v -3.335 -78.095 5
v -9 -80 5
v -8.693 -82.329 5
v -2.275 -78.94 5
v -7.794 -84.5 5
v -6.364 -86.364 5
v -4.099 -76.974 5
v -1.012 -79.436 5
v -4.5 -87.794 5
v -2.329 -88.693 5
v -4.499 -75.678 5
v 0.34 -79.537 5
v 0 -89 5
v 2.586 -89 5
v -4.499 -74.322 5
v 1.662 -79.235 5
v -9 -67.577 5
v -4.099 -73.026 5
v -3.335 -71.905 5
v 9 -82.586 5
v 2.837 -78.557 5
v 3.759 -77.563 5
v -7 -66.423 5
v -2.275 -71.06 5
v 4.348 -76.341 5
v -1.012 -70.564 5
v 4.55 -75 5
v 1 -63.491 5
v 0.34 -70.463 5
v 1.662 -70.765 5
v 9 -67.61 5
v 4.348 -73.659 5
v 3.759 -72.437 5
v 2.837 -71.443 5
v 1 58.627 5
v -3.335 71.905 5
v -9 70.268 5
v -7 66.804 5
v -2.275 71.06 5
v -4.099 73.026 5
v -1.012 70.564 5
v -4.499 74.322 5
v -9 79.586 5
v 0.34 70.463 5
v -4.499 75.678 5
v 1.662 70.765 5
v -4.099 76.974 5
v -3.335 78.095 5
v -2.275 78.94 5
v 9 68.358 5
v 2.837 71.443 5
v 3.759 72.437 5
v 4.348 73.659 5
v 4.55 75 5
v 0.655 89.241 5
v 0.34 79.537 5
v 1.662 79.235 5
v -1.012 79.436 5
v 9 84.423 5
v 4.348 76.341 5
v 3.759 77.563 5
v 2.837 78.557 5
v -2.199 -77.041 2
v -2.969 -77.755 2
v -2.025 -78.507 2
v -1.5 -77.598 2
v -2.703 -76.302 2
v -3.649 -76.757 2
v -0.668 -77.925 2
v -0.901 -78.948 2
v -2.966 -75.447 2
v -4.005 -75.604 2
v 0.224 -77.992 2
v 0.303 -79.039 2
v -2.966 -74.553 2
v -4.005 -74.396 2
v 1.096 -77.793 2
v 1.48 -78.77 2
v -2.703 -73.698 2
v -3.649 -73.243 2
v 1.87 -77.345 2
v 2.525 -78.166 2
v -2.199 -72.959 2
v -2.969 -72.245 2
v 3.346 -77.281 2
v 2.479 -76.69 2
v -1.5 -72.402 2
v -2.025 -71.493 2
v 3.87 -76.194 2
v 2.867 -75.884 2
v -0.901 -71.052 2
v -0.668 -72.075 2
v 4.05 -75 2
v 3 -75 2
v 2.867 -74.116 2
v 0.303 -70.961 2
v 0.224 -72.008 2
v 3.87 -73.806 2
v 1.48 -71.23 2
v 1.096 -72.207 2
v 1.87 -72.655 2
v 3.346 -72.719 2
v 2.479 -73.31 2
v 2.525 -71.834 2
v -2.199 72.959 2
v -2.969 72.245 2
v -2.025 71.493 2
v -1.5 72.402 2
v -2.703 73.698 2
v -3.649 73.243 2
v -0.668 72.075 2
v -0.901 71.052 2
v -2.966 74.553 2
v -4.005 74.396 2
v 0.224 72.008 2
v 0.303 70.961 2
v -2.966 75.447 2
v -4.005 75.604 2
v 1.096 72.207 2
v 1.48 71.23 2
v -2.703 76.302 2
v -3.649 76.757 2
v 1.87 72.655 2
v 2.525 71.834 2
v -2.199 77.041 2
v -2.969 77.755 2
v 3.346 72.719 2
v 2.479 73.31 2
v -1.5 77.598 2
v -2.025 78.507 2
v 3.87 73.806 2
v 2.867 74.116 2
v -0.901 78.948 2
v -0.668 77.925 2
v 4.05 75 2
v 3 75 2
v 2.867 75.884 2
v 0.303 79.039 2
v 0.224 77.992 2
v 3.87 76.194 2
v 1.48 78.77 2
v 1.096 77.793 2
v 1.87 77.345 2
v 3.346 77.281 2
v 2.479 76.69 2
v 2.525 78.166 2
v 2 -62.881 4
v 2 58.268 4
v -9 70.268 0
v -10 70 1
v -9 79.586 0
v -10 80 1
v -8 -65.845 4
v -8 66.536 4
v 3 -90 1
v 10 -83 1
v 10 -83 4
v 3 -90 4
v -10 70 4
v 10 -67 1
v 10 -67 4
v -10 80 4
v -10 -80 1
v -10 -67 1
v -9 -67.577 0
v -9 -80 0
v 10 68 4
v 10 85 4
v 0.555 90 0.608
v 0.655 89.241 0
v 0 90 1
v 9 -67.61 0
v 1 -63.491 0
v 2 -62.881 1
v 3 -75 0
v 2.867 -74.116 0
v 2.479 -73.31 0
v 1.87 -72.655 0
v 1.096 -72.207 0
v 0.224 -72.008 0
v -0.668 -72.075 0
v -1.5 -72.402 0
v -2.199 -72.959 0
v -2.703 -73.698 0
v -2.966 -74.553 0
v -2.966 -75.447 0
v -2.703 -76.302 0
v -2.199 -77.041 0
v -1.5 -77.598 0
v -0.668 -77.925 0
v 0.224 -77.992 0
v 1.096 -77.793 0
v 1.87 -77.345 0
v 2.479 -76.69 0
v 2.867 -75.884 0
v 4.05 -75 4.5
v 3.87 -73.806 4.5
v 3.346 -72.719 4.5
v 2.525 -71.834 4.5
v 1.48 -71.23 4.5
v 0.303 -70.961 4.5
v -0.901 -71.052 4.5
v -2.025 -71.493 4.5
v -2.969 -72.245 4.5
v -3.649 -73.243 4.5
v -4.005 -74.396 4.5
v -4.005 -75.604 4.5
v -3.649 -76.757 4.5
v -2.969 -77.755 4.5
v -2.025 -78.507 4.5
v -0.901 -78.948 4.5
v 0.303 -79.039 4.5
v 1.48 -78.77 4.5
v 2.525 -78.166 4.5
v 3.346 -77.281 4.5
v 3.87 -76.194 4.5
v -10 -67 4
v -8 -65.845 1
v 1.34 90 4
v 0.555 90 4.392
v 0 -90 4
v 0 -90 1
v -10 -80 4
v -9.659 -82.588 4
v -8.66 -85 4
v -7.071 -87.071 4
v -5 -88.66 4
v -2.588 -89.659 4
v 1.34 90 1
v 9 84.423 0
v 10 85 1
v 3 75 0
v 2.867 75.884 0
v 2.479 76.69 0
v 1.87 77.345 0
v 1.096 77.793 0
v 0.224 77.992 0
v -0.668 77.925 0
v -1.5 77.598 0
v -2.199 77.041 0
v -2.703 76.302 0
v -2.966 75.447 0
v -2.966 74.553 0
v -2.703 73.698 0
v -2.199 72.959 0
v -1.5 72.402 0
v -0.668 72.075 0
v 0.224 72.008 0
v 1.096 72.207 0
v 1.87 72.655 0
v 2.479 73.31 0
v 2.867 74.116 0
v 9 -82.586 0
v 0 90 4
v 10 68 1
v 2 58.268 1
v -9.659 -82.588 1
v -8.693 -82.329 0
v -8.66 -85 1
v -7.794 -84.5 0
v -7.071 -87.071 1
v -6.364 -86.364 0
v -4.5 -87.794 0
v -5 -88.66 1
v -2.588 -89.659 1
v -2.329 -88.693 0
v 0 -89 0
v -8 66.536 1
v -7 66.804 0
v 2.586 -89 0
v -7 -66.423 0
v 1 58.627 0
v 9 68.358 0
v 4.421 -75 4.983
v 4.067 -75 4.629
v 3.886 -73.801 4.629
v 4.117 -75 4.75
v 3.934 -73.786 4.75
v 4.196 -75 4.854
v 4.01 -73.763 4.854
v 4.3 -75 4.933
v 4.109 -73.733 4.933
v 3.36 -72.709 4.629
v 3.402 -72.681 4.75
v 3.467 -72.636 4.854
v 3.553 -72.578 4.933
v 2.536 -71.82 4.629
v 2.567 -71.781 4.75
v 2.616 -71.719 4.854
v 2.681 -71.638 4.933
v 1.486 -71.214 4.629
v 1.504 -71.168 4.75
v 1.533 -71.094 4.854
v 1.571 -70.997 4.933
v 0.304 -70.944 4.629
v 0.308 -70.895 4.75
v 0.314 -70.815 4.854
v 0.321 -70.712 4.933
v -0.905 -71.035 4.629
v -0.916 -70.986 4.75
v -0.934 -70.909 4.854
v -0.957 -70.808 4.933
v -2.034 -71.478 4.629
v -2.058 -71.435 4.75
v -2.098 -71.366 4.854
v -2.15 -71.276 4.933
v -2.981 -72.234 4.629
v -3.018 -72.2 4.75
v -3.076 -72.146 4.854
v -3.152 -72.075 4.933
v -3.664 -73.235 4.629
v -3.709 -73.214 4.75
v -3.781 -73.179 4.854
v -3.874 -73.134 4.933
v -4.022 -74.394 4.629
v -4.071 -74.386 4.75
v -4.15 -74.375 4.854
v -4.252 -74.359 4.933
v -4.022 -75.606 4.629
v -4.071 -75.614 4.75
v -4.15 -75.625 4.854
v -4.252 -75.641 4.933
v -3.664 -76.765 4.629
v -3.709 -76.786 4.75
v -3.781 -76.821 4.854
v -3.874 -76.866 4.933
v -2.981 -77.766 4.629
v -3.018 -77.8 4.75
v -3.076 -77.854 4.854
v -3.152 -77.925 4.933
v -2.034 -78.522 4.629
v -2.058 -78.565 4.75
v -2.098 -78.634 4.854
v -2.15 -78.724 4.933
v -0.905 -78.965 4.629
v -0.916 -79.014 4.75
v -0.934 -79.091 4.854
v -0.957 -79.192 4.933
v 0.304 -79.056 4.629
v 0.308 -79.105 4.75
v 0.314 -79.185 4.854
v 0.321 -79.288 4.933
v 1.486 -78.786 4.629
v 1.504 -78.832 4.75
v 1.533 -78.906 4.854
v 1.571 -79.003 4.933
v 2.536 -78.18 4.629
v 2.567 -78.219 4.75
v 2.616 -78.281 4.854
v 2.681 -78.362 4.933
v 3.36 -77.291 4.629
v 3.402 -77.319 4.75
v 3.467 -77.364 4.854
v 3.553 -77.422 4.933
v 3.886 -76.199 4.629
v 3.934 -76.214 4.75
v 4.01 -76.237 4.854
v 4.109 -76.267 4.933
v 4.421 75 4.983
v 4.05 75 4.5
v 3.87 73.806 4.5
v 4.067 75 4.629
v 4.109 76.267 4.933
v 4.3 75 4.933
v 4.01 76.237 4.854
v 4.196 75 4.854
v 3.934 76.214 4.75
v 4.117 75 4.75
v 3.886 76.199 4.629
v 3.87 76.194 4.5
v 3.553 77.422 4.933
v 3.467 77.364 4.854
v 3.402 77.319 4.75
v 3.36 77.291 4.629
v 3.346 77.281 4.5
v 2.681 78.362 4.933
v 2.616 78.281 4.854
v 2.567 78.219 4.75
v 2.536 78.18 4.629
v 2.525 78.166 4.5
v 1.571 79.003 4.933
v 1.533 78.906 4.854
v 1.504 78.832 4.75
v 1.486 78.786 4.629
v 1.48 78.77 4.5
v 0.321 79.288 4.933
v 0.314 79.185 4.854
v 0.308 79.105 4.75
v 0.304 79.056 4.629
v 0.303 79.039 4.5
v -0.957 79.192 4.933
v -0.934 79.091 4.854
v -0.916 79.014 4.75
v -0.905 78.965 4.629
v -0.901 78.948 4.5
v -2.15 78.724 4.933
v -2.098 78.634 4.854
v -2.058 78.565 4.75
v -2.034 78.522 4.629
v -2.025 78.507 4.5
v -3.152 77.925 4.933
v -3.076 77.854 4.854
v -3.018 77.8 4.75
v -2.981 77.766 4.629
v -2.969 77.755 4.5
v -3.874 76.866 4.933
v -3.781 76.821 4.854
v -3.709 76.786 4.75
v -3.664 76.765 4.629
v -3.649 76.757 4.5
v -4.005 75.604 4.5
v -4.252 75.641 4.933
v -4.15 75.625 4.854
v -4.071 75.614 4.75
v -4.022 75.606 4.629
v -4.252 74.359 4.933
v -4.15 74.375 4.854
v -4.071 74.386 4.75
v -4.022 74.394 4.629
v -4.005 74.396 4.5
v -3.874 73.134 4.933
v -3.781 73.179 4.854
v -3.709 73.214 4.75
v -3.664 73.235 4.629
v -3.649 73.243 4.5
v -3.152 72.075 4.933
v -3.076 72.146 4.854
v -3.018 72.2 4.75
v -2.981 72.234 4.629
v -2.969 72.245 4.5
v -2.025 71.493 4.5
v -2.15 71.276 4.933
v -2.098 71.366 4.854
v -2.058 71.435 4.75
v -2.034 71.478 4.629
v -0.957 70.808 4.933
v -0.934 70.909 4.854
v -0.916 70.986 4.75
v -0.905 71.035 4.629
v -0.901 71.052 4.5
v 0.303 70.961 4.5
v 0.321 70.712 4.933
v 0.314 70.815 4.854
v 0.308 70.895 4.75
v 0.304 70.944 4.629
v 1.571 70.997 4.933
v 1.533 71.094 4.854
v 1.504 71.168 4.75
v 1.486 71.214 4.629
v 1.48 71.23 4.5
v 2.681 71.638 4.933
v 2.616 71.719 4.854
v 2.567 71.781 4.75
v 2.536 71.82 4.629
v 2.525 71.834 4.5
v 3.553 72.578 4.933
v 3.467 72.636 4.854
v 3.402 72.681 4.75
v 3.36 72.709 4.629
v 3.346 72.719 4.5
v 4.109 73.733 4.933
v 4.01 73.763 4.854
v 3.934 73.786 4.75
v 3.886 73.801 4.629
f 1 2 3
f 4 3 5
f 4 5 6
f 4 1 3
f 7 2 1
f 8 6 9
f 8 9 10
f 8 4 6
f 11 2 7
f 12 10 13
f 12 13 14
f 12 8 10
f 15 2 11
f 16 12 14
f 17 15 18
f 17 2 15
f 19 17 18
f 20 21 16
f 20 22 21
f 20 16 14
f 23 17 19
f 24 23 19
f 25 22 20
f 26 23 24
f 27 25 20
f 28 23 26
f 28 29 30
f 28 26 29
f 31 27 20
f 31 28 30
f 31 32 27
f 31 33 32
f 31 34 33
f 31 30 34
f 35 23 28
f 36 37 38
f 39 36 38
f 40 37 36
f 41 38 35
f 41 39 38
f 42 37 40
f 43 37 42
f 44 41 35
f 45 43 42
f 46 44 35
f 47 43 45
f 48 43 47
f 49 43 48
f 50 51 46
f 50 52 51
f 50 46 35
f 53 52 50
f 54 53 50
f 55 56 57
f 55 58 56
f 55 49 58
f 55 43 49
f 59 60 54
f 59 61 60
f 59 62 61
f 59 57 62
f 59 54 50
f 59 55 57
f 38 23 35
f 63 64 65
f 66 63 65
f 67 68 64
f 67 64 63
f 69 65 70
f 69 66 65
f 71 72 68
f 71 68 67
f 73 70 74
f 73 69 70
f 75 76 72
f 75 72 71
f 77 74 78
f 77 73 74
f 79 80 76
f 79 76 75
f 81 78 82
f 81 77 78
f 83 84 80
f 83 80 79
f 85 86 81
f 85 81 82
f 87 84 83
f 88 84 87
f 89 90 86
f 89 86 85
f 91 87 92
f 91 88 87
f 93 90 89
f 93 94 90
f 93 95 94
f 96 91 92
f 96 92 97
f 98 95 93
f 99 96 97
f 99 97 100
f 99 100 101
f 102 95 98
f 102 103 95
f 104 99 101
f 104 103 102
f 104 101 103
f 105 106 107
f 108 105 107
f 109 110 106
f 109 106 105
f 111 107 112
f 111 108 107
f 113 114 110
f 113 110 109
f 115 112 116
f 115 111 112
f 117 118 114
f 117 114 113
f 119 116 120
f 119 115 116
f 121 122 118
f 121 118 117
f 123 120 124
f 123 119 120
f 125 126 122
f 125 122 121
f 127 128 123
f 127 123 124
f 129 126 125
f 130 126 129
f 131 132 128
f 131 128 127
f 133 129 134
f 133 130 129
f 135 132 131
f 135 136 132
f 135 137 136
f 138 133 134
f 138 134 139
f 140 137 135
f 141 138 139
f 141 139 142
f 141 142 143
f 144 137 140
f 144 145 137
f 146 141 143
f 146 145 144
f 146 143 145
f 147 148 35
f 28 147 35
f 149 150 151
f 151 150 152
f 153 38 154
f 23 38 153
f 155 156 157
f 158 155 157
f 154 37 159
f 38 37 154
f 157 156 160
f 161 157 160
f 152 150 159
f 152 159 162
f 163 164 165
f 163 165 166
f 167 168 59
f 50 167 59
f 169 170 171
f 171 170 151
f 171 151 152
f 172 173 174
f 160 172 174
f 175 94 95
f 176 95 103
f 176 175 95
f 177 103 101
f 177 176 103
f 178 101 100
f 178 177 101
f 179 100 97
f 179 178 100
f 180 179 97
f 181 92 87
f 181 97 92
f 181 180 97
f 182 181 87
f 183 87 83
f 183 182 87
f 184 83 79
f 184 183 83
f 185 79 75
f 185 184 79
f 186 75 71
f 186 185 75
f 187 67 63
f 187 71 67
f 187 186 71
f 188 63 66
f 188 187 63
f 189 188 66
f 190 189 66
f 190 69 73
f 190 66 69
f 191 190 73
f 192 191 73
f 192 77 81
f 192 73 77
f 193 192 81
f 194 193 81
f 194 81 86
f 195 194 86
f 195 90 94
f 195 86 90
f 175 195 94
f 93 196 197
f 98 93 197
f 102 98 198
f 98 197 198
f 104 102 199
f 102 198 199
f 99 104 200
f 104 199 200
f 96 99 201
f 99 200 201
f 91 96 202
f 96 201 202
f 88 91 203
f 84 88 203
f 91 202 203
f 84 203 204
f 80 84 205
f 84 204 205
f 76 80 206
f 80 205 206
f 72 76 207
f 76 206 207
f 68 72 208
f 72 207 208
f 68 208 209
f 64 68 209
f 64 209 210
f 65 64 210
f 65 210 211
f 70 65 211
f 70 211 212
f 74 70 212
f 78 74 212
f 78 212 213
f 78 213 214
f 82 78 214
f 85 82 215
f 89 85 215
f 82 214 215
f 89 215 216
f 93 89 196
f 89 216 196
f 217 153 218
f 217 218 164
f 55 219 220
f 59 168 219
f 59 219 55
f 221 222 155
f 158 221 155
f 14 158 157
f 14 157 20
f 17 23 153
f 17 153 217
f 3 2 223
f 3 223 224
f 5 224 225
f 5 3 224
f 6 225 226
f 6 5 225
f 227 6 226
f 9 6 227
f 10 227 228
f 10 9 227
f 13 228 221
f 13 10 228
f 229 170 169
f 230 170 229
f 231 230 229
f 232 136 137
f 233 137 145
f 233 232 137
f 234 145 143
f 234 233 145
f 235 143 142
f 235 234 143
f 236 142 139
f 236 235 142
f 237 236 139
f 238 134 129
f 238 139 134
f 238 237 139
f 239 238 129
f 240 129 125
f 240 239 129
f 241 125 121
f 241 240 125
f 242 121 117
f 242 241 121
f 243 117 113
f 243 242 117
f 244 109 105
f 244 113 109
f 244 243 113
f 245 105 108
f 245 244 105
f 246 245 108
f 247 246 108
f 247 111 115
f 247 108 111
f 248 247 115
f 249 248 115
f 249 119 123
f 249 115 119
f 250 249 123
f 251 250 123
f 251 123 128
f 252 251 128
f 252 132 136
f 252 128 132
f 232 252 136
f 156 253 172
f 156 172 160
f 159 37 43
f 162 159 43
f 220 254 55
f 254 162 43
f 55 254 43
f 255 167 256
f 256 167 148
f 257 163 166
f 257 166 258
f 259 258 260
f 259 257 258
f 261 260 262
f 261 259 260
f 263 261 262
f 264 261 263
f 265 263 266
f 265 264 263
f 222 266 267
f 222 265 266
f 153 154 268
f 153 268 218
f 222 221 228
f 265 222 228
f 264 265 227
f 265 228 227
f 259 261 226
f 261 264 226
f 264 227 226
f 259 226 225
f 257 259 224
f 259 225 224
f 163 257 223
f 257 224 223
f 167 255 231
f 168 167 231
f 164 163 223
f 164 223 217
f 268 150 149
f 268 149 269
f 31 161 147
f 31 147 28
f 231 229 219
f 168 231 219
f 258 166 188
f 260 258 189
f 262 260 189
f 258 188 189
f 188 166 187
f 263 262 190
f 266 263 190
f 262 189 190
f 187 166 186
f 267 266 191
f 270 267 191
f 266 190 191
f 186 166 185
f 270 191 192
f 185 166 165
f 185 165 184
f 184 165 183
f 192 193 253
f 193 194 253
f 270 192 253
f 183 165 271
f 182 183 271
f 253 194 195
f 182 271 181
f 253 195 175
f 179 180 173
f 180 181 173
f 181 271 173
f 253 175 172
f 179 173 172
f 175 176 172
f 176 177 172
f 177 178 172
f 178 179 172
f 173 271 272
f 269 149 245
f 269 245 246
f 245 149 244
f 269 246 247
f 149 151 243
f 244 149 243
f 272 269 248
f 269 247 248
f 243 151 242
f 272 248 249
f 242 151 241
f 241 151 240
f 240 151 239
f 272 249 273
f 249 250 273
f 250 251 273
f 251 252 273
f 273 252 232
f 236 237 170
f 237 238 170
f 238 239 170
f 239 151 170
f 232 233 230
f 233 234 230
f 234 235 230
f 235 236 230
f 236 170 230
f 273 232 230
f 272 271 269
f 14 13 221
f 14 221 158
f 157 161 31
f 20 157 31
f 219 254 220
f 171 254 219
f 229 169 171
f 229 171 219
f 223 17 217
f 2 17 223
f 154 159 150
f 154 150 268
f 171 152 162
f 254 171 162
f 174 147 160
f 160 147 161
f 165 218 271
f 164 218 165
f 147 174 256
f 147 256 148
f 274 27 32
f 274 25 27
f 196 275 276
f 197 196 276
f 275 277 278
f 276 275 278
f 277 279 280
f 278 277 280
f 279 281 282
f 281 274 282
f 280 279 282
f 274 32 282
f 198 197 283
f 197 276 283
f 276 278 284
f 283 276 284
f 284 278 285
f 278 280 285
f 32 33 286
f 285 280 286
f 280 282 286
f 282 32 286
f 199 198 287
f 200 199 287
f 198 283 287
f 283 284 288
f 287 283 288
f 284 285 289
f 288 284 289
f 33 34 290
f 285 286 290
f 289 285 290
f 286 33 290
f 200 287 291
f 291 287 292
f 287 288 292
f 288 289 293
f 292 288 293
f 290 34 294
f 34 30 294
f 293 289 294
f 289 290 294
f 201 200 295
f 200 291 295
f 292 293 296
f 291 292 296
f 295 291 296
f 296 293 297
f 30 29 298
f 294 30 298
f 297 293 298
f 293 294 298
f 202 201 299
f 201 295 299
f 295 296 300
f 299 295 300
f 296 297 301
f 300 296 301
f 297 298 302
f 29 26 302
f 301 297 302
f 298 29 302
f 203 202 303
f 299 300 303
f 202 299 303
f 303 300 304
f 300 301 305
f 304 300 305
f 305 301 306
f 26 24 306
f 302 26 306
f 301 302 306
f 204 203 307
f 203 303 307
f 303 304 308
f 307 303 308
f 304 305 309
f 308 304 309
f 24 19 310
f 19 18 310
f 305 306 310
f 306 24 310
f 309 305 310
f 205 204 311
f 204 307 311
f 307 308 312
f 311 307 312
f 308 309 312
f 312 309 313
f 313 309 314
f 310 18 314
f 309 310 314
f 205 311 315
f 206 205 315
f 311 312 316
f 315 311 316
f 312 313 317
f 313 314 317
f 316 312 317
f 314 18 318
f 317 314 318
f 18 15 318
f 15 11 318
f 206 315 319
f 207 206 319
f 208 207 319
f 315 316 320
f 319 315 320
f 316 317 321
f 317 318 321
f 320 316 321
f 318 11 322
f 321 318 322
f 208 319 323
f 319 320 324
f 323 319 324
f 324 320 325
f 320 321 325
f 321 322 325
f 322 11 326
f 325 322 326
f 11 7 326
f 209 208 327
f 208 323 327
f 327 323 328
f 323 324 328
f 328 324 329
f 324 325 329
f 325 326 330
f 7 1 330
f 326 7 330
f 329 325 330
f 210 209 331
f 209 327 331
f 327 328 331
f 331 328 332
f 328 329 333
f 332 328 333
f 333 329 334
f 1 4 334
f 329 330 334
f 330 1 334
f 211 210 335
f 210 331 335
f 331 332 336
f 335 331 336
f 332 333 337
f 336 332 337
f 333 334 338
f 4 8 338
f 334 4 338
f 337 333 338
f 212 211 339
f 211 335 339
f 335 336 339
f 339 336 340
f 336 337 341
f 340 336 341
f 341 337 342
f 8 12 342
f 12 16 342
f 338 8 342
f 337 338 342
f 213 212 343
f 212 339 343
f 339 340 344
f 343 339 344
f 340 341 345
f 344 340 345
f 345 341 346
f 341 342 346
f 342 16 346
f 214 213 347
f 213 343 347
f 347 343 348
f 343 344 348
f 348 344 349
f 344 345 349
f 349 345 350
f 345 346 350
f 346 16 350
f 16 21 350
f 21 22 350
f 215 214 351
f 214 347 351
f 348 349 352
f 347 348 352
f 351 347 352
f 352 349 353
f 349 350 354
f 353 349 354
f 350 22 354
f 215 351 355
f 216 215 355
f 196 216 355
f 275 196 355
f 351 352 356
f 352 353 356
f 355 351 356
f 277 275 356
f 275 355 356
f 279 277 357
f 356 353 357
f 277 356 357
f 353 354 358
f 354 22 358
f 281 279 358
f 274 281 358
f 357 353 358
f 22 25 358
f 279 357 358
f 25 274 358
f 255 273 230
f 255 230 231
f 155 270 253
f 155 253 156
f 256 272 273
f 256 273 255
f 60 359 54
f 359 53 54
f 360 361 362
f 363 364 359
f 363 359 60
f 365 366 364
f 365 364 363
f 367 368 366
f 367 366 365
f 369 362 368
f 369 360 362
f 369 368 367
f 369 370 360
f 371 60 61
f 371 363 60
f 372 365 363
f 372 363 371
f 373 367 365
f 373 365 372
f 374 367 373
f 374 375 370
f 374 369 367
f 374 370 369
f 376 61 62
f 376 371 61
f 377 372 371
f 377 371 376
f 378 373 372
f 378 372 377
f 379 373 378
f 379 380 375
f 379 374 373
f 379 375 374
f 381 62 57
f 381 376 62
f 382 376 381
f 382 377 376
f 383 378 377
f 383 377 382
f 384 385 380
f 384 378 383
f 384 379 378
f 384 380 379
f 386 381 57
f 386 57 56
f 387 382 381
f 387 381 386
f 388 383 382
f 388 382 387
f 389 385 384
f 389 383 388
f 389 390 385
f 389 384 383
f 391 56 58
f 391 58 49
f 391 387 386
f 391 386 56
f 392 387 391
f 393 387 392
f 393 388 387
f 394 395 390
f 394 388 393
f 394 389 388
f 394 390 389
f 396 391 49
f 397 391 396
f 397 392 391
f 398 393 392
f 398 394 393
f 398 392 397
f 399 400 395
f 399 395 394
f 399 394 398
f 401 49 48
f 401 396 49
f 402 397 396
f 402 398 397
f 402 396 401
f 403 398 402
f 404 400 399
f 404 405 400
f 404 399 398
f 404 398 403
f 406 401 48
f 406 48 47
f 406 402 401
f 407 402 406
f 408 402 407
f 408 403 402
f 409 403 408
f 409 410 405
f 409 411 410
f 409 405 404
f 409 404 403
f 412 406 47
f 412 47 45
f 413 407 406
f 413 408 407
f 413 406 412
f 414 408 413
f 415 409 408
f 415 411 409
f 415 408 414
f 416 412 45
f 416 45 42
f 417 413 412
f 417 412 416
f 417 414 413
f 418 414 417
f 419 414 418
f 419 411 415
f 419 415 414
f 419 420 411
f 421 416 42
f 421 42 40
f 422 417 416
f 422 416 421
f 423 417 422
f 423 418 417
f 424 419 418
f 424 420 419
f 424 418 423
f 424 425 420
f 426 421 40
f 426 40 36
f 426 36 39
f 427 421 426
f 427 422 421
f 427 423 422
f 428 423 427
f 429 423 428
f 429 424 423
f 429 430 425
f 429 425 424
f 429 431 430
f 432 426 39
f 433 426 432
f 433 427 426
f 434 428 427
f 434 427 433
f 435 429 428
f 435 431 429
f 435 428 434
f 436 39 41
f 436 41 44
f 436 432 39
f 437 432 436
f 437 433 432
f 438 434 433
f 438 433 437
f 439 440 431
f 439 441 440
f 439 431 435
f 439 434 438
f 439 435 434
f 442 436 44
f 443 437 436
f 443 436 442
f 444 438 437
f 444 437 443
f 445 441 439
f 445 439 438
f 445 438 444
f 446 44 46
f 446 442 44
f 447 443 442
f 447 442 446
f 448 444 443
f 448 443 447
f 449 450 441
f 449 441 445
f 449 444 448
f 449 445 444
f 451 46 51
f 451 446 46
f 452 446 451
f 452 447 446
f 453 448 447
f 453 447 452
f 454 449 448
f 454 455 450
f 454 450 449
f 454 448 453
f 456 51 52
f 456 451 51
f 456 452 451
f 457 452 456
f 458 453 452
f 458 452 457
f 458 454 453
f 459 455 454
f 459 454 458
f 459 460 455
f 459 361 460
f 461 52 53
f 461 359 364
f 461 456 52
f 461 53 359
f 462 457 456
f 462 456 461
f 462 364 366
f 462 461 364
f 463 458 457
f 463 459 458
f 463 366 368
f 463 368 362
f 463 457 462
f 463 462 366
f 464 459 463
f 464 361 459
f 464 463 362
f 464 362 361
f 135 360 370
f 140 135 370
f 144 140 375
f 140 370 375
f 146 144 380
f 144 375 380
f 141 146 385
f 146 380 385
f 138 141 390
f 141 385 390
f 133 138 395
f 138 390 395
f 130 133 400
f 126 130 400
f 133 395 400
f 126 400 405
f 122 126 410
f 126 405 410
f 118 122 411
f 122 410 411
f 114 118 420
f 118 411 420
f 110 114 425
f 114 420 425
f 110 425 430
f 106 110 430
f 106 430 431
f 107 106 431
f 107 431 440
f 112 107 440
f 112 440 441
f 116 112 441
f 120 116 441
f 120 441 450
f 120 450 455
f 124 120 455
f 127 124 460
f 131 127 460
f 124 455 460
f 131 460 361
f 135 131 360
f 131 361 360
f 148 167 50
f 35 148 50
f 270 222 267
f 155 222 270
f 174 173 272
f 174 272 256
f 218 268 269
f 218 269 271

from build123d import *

# Parameters (mm, degrees)
SKETCH_1_W          = 20
SKETCH_1_H          = 180
SKETCH_1_R          = 3
EXTRUDE_1_DEPTH     = 5
SKETCH_2_R          = 4.05
CUT_EXTRUDE_1_DEPTH = 3
CHAMFER_1_SIZE      = 10
CHAMFER_2_SIZE      = 5
CHAMFER_2_SIZE2     = 8.660254038
CUT_EXTRUDE_2_DEPTH = 10
FILLET_1_R          = 10
CHAMFER_3_SIZE      = 7
CHAMFER_5_SIZE      = 1
CUT_EXTRUDE_3_DEPTH = 10
CHAMFER_6_SIZE      = 1
FILLET_2_R          = 0.5
FILLET_3_R          = 0.5


with BuildPart() as part:
    # 草图1 → 凸台-拉伸1 (new body)
    with BuildSketch(Plane.XY):
        Rectangle(SKETCH_1_W, SKETCH_1_H)
        with Locations((0, -75)):
            Circle(SKETCH_1_R, mode=Mode.SUBTRACT)
        with Locations((0, 75)):
            Circle(SKETCH_1_R, mode=Mode.SUBTRACT)
    extrude(amount=EXTRUDE_1_DEPTH)

    # 草图2 → 切除-拉伸1 (cut)
    with BuildSketch(Plane.XY.offset(5)):
        with Locations((0, 75)):
            Circle(SKETCH_2_R)
        with Locations((0, -75)):
            Circle(SKETCH_2_R)
    extrude(amount=-CUT_EXTRUDE_1_DEPTH, mode=Mode.SUBTRACT)

    # 倒角1
    chamfer_1_edges = [part.edges().sort_by_distance(p)[0] for p in [
        (-10, 90, 2.5),
    ]]
    chamfer(chamfer_1_edges, length=CHAMFER_1_SIZE)

    # 倒角2
    chamfer_2_edges = [part.edges().sort_by_distance(p)[0] for p in [
        (10, 90, 2.5),
    ]]
    chamfer_2_side = [part.faces().sort_by_distance(p)[0] for p in [
        (10, 0, 2.5),
    ]]
    chamfer(chamfer_2_edges, length=CHAMFER_2_SIZE, length2=CHAMFER_2_SIZE2, reference=chamfer_2_side[0])

    # 草图3 → 切除-拉伸2 (cut)
    with BuildSketch(Plane.XY.offset(5)):
        Polygon((10, 68), (2, 58.268253796), (2, -62.880981993), (10, -67), align=None)
    extrude(amount=-CUT_EXTRUDE_2_DEPTH, mode=Mode.SUBTRACT)

    # 圆角1
    fillet_1_edges = [part.edges().sort_by_distance(p)[0] for p in [
        (-10, -90, 2.5),
    ]]
    fillet(fillet_1_edges, radius=FILLET_1_R)

    # 倒角3
    chamfer_3_edges = [part.edges().sort_by_distance(p)[0] for p in [
        (10, -90, 2.5),
    ]]
    chamfer(chamfer_3_edges, length=CHAMFER_3_SIZE)

    # 倒角5
    # the kernel refuses this chamfer: 1 mm, written as the material it takes off along each edge
    with BuildSketch(Plane(origin=(-11.81845448, 78.18154552, 0), x_dir=(0.7068394360706736, -0.7068394360706736, -0.02749587661058609), z_dir=(0.7071067811865476, 0.7071067811865476, 0)), Plane(origin=(-11.81845448, 78.18154552, 5), x_dir=(-0.019442520806012064, 0.019442520806012064, -0.9996219169112968), z_dir=(0.7071067811865476, 0.7071067811865476, 0))) as chamfer_5_piece_1:
        Polygon((CHAMFER_5_SIZE * 0.999621916911, -CHAMFER_5_SIZE * 0.0274958766106), (-CHAMFER_5_SIZE * 0.0274958766106, -CHAMFER_5_SIZE * 0.999621916911), (0, 0), align=None)
    extrude(amount=19.2855016, mode=Mode.SUBTRACT)
    with BuildSketch(Plane(origin=(12.227142798, 83.714158506, 0), x_dir=(-0.49981095845564655, -0.8656979742248815, -0.02749587661058648), z_dir=(-0.8660254037844397, 0.49999999999999817, 0)), Plane(origin=(12.227142798, 83.714158506, 5), x_dir=(0.013747938305290464, 0.02381212764408557, -0.999621916911297), z_dir=(-0.8660254037844397, 0.49999999999999817, 0))) as chamfer_5_piece_2:
        Polygon((CHAMFER_5_SIZE * 0.999621916911, CHAMFER_5_SIZE * 0.0274958766106), (-CHAMFER_5_SIZE * 0.0274958766106, CHAMFER_5_SIZE * 0.999621916911), (0, 0), align=None)
    extrude(amount=15.143365976, mode=Mode.SUBTRACT)
    with BuildSketch(Plane(origin=(1.18154552, -91.81845448, 0), x_dir=(-0.7068394360706736, 0.7068394360706735, -0.027495876610586254), z_dir=(0.7071067811865476, 0.7071067811865476, 0)), Plane(origin=(1.18154552, -91.81845448, 5), x_dir=(0.01944252080601271, -0.01944252080601271, -0.9996219169112968), z_dir=(0.7071067811865476, 0.7071067811865476, 0))) as chamfer_5_piece_3:
        Polygon((CHAMFER_5_SIZE * 0.999621916911, CHAMFER_5_SIZE * 0.0274958766106), (-CHAMFER_5_SIZE * 0.0274958766106, CHAMFER_5_SIZE * 0.999621916911), (0, 0), align=None)
    extrude(amount=15.042860913, mode=Mode.SUBTRACT)
    with BuildSketch(Plane(origin=(10, -85.571682988, 0), x_dir=(-0.9996219169112968, 0, -0.02749587661058639), z_dir=(0, 1, 0)), Plane(origin=(10, -85.571682988, 5), x_dir=(0.027495876610585623, 0, -0.9996219169112968), z_dir=(0, 1, 0))) as chamfer_5_piece_4:
        Polygon((CHAMFER_5_SIZE * 0.999621916911, CHAMFER_5_SIZE * 0.0274958766106), (-CHAMFER_5_SIZE * 0.0274958766106, CHAMFER_5_SIZE * 0.999621916911), (0, 0), align=None)
    extrude(amount=21.143365976, mode=Mode.SUBTRACT)
    with BuildSketch(Plane(origin=(-0.286415982, -61.703758417, 0), x_dir=(-0.4575908043726023, -0.8887376623745898, -0.027495876610586185), z_dir=(0.8890738061453024, -0.4577638771531731, 0))) as chamfer_5_piece_5_section:
        Polygon((CHAMFER_5_SIZE * 0.999621916911, -CHAMFER_5_SIZE * 0.0274958766106), (-CHAMFER_5_SIZE * 0.0274958766106, -CHAMFER_5_SIZE * 0.999621916911), (0, 0), align=None)
    chamfer_5_piece_5 = extrude(amount=14.141494078, mode=Mode.PRIVATE)
    chamfer_5_piece_5 = split(chamfer_5_piece_5, bisect_by=Plane(origin=(2, -65.858290637, 0.331326909), z_dir=(1, 0, 0)), keep=Keep.TOP, mode=Mode.PRIVATE)
    add(chamfer_5_piece_5, mode=Mode.SUBTRACT)
    with BuildSketch(Plane(origin=(10, 65.428317012, 0), x_dir=(-0.9996219169112968, 0, -0.02749587661058639), z_dir=(0, 1, 0)), Plane(origin=(10, 65.428317012, 5), x_dir=(0.027495876610585623, 0, -0.9996219169112968), z_dir=(0, 1, 0))) as chamfer_5_piece_6:
        Polygon((CHAMFER_5_SIZE * 0.999621916911, CHAMFER_5_SIZE * 0.0274958766106), (-CHAMFER_5_SIZE * 0.0274958766106, CHAMFER_5_SIZE * 0.999621916911), (0, 0), align=None)
    extrude(amount=22.143365976, mode=Mode.SUBTRACT)
    with BuildSketch(Plane(origin=(11.633087807, 69.986599508, 0), x_dir=(-0.7721979799806099, 0.6347867803312237, -0.02749587661058653), z_dir=(-0.6350268732528727, -0.7724900454029683, 0))) as chamfer_5_piece_7_section:
        Polygon((CHAMFER_5_SIZE * 0.999621916911, -CHAMFER_5_SIZE * 0.0274958766106), (-CHAMFER_5_SIZE * 0.0274958766106, -CHAMFER_5_SIZE * 0.999621916911), (0, 0), align=None)
    chamfer_5_piece_7 = extrude(amount=17.741258029, mode=Mode.PRIVATE)
    chamfer_5_piece_7 = split(chamfer_5_piece_7, bisect_by=Plane(origin=(2, 64.486030302, 0.332589974), z_dir=(1, 0, 0)), keep=Keep.TOP, mode=Mode.PRIVATE)
    add(chamfer_5_piece_7, mode=Mode.SUBTRACT)
    with BuildSketch(Plane(origin=(2, 60.839936784, 0), x_dir=(-0.9996219169112968, 0, -0.027495876610586365), z_dir=(0, -1, 0))) as chamfer_5_piece_8_section:
        Polygon((CHAMFER_5_SIZE * 0.999621916911, -CHAMFER_5_SIZE * 0.0274958766106), (-CHAMFER_5_SIZE * 0.0274958766106, -CHAMFER_5_SIZE * 0.999621916911), (0, 0), align=None)
    chamfer_5_piece_8 = extrude(amount=126.292601765, mode=Mode.PRIVATE)
    chamfer_5_piece_8 = split(chamfer_5_piece_8, bisect_by=Plane(origin=(-22.866025016, -50.078031392, 0.330281086), z_dir=(0.4577638771531731, 0.8890738061453024, 0)), keep=Keep.TOP, mode=Mode.PRIVATE)
    chamfer_5_piece_8 = split(chamfer_5_piece_8, bisect_by=Plane(origin=(-27.904215912, 21.890723836, 0.330281086), z_dir=(0.7724900454029683, -0.6350268732528727, 0)), keep=Keep.TOP, mode=Mode.PRIVATE)
    add(chamfer_5_piece_8, mode=Mode.SUBTRACT)
    with BuildSketch(Plane(origin=(-0.286415982, -61.703758417, 5), x_dir=(0.012586619082987256, 0.024445863671475603, -0.9996219169112968), z_dir=(0.8890738061453024, -0.4577638771531731, 0))) as chamfer_5_piece_9_section:
        Polygon((CHAMFER_5_SIZE * 0.999621916911, -CHAMFER_5_SIZE * 0.0274958766106), (-CHAMFER_5_SIZE * 0.0274958766106, -CHAMFER_5_SIZE * 0.999621916911), (0, 0), align=None)
    chamfer_5_piece_9 = extrude(amount=14.141494078, mode=Mode.PRIVATE)
    chamfer_5_piece_9 = split(chamfer_5_piece_9, bisect_by=Plane(origin=(2, -65.858290637, 4.668673091), z_dir=(1, 0, 0)), keep=Keep.TOP, mode=Mode.PRIVATE)
    add(chamfer_5_piece_9, mode=Mode.SUBTRACT)
    with BuildSketch(Plane(origin=(11.633087807, 69.986599508, 5), x_dir=(0.02124029097130686, -0.017460620551367937, -0.9996219169112968), z_dir=(-0.6350268732528727, -0.7724900454029683, 0))) as chamfer_5_piece_10_section:
        Polygon((CHAMFER_5_SIZE * 0.999621916911, -CHAMFER_5_SIZE * 0.0274958766106), (-CHAMFER_5_SIZE * 0.0274958766106, -CHAMFER_5_SIZE * 0.999621916911), (0, 0), align=None)
    chamfer_5_piece_10 = extrude(amount=17.741258029, mode=Mode.PRIVATE)
    chamfer_5_piece_10 = split(chamfer_5_piece_10, bisect_by=Plane(origin=(2, 64.486030302, 4.667410026), z_dir=(1, 0, 0)), keep=Keep.TOP, mode=Mode.PRIVATE)
    add(chamfer_5_piece_10, mode=Mode.SUBTRACT)
    with BuildSketch(Plane(origin=(2, 60.839936784, 5), x_dir=(0.027495876610586487, 0, -0.9996219169112968), z_dir=(0, -1, 0))) as chamfer_5_piece_11_section:
        Polygon((CHAMFER_5_SIZE * 0.999621916911, -CHAMFER_5_SIZE * 0.0274958766106), (-CHAMFER_5_SIZE * 0.0274958766106, -CHAMFER_5_SIZE * 0.999621916911), (0, 0), align=None)
    chamfer_5_piece_11 = extrude(amount=126.292601765, mode=Mode.PRIVATE)
    chamfer_5_piece_11 = split(chamfer_5_piece_11, bisect_by=Plane(origin=(-22.866025016, -50.078031392, 4.669718914), z_dir=(0.4577638771531731, 0.8890738061453024, 0)), keep=Keep.TOP, mode=Mode.PRIVATE)
    chamfer_5_piece_11 = split(chamfer_5_piece_11, bisect_by=Plane(origin=(-27.904215912, 21.890723836, 4.669718914), z_dir=(0.7724900454029683, -0.6350268732528727, 0)), keep=Keep.TOP, mode=Mode.PRIVATE)
    add(chamfer_5_piece_11, mode=Mode.SUBTRACT)
    with BuildSketch(Plane(origin=(-0.286415982, -61.703758417, 0), x_dir=(-0.4575908043726023, -0.8887376623745898, -0.027495876610586185), z_dir=(0.8890738061453024, -0.4577638771531731, 0))) as chamfer_5_piece_12a_section:
        Polygon((CHAMFER_5_SIZE * 0.999621916911, -CHAMFER_5_SIZE * 0.0274958766106), (-CHAMFER_5_SIZE * 0.0274958766106, -CHAMFER_5_SIZE * 0.999621916911), (0, 0), align=None)
    chamfer_5_piece_12a = extrude(amount=14.141494078, mode=Mode.PRIVATE)
    chamfer_5_piece_12a = split(chamfer_5_piece_12a, bisect_by=Plane(origin=(2, -62.636454887, 0.323417731), z_dir=(-1, 0, 0)), keep=Keep.TOP, mode=Mode.PRIVATE)
    with BuildSketch(Plane(origin=(2, 60.839936784, 0), x_dir=(-0.9996219169112968, 0, -0.027495876610586365), z_dir=(0, -1, 0))) as chamfer_5_piece_12b_section:
        Polygon((CHAMFER_5_SIZE * 0.999621916911, -CHAMFER_5_SIZE * 0.0274958766106), (-CHAMFER_5_SIZE * 0.0274958766106, -CHAMFER_5_SIZE * 0.999621916911), (0, 0), align=None)
    chamfer_5_piece_12b = extrude(amount=126.292601765, mode=Mode.PRIVATE)
    chamfer_5_piece_12b = split(chamfer_5_piece_12b, bisect_by=Plane(origin=(2.217402645, -62.992917669, 0.323417731), z_dir=(-0.4577638771531731, -0.8890738061453024, 0)), keep=Keep.TOP, mode=Mode.PRIVATE)
    chamfer_5_piece_12 = chamfer_5_piece_12a & chamfer_5_piece_12b
    add(chamfer_5_piece_12, mode=Mode.SUBTRACT)
    with BuildSketch(Plane(origin=(2, 60.839936784, 0), x_dir=(-0.9996219169112968, 0, -0.027495876610586365), z_dir=(0, -1, 0))) as chamfer_5_piece_13a_section:
        Polygon((CHAMFER_5_SIZE * 0.999621916911, -CHAMFER_5_SIZE * 0.0274958766106), (-CHAMFER_5_SIZE * 0.0274958766106, -CHAMFER_5_SIZE * 0.999621916911), (0, 0), align=None)
    chamfer_5_piece_13a = extrude(amount=126.292601765, mode=Mode.PRIVATE)
    chamfer_5_piece_13a = split(chamfer_5_piece_13a, bisect_by=Plane(origin=(2.381147495, 58.731907632, 0.315902133), z_dir=(-0.7724900454029683, 0.6350268732528727, 0)), keep=Keep.TOP, mode=Mode.PRIVATE)
    with BuildSketch(Plane(origin=(11.633087807, 69.986599508, 0), x_dir=(-0.7721979799806099, 0.6347867803312237, -0.02749587661058653), z_dir=(-0.6350268732528727, -0.7724900454029683, 0))) as chamfer_5_piece_13b_section:
        Polygon((CHAMFER_5_SIZE * 0.999621916911, -CHAMFER_5_SIZE * 0.0274958766106), (-CHAMFER_5_SIZE * 0.0274958766106, -CHAMFER_5_SIZE * 0.999621916911), (0, 0), align=None)
    chamfer_5_piece_13b = extrude(amount=17.741258029, mode=Mode.PRIVATE)
    chamfer_5_piece_13b = split(chamfer_5_piece_13b, bisect_by=Plane(origin=(2, 57.668046921, 0.315902133), z_dir=(-1, 0, 0)), keep=Keep.TOP, mode=Mode.PRIVATE)
    chamfer_5_piece_13 = chamfer_5_piece_13a & chamfer_5_piece_13b
    add(chamfer_5_piece_13, mode=Mode.SUBTRACT)
    with BuildSketch(Plane(origin=(-0.286415982, -61.703758417, 5), x_dir=(0.012586619082987256, 0.024445863671475603, -0.9996219169112968), z_dir=(0.8890738061453024, -0.4577638771531731, 0))) as chamfer_5_piece_14a_section:
        Polygon((CHAMFER_5_SIZE * 0.999621916911, -CHAMFER_5_SIZE * 0.0274958766106), (-CHAMFER_5_SIZE * 0.0274958766106, -CHAMFER_5_SIZE * 0.999621916911), (0, 0), align=None)
    chamfer_5_piece_14a = extrude(amount=14.141494078, mode=Mode.PRIVATE)
    chamfer_5_piece_14a = split(chamfer_5_piece_14a, bisect_by=Plane(origin=(2, -62.636454887, 4.676582269), z_dir=(-1, 0, 0)), keep=Keep.TOP, mode=Mode.PRIVATE)
    with BuildSketch(Plane(origin=(2, 60.839936784, 5), x_dir=(0.027495876610586487, 0, -0.9996219169112968), z_dir=(0, -1, 0))) as chamfer_5_piece_14b_section:
        Polygon((CHAMFER_5_SIZE * 0.999621916911, -CHAMFER_5_SIZE * 0.0274958766106), (-CHAMFER_5_SIZE * 0.0274958766106, -CHAMFER_5_SIZE * 0.999621916911), (0, 0), align=None)
    chamfer_5_piece_14b = extrude(amount=126.292601765, mode=Mode.PRIVATE)
    chamfer_5_piece_14b = split(chamfer_5_piece_14b, bisect_by=Plane(origin=(2.217402645, -62.992917669, 4.676582269), z_dir=(-0.4577638771531731, -0.8890738061453024, 0)), keep=Keep.TOP, mode=Mode.PRIVATE)
    chamfer_5_piece_14 = chamfer_5_piece_14a & chamfer_5_piece_14b
    add(chamfer_5_piece_14, mode=Mode.SUBTRACT)
    with BuildSketch(Plane(origin=(2, 60.839936784, 5), x_dir=(0.027495876610586487, 0, -0.9996219169112968), z_dir=(0, -1, 0))) as chamfer_5_piece_15a_section:
        Polygon((CHAMFER_5_SIZE * 0.999621916911, -CHAMFER_5_SIZE * 0.0274958766106), (-CHAMFER_5_SIZE * 0.0274958766106, -CHAMFER_5_SIZE * 0.999621916911), (0, 0), align=None)
    chamfer_5_piece_15a = extrude(amount=126.292601765, mode=Mode.PRIVATE)
    chamfer_5_piece_15a = split(chamfer_5_piece_15a, bisect_by=Plane(origin=(2.381147495, 58.731907632, 4.684097867), z_dir=(-0.7724900454029683, 0.6350268732528727, 0)), keep=Keep.TOP, mode=Mode.PRIVATE)
    with BuildSketch(Plane(origin=(11.633087807, 69.986599508, 5), x_dir=(0.02124029097130686, -0.017460620551367937, -0.9996219169112968), z_dir=(-0.6350268732528727, -0.7724900454029683, 0))) as chamfer_5_piece_15b_section:
        Polygon((CHAMFER_5_SIZE * 0.999621916911, -CHAMFER_5_SIZE * 0.0274958766106), (-CHAMFER_5_SIZE * 0.0274958766106, -CHAMFER_5_SIZE * 0.999621916911), (0, 0), align=None)
    chamfer_5_piece_15b = extrude(amount=17.741258029, mode=Mode.PRIVATE)
    chamfer_5_piece_15b = split(chamfer_5_piece_15b, bisect_by=Plane(origin=(2, 57.668046921, 4.684097867), z_dir=(-1, 0, 0)), keep=Keep.TOP, mode=Mode.PRIVATE)
    chamfer_5_piece_15 = chamfer_5_piece_15a & chamfer_5_piece_15b
    add(chamfer_5_piece_15, mode=Mode.SUBTRACT)

    # 草图4 → 切除-拉伸3 (cut)
    with BuildSketch(Plane.XY.offset(5)):
        Polygon((-10, 70), (-8, 66.535898385), (-8, -65.845299462), (-10, -67), align=None)
    extrude(amount=-CUT_EXTRUDE_3_DEPTH, mode=Mode.SUBTRACT)

    # 倒角6
    chamfer_6_edges = [part.edges().sort_by_distance(p)[0] for p in [
        (-9, -66.422649731, 0),
        (-10, 74.292893219, 0),
        (-9, 68.267949192, 0),
        (-8, 0.345299462, 0),
        (0.792893219, -90, 0),
        (-10, -73.5, 0),
        (-7.071067812, -87.071067812, 0),
        (0.792893219, -90, 5),
        (-7.071067812, -87.071067812, 5),
        (-10, 74.292893219, 5),
        (-9, 68.267949192, 5),
        (-8, 0.345299462, 5),
        (-9, -66.422649731, 5),
        (-10, -73.5, 5),
    ]]
    chamfer(chamfer_6_edges, length=CHAMFER_6_SIZE)

    # 圆角2
    fillet_2_edges = [part.edges().sort_by_distance(p)[0] for p in [
        (-4.05, -75, 5),
    ]]
    fillet(fillet_2_edges, radius=FILLET_2_R)

    # 圆角3
    fillet_3_edges = [part.edges().sort_by_distance(p)[0] for p in [
        (-4.05, 75, 5),
    ]]
    fillet(fillet_3_edges, radius=FILLET_3_R)


solid = part.part
